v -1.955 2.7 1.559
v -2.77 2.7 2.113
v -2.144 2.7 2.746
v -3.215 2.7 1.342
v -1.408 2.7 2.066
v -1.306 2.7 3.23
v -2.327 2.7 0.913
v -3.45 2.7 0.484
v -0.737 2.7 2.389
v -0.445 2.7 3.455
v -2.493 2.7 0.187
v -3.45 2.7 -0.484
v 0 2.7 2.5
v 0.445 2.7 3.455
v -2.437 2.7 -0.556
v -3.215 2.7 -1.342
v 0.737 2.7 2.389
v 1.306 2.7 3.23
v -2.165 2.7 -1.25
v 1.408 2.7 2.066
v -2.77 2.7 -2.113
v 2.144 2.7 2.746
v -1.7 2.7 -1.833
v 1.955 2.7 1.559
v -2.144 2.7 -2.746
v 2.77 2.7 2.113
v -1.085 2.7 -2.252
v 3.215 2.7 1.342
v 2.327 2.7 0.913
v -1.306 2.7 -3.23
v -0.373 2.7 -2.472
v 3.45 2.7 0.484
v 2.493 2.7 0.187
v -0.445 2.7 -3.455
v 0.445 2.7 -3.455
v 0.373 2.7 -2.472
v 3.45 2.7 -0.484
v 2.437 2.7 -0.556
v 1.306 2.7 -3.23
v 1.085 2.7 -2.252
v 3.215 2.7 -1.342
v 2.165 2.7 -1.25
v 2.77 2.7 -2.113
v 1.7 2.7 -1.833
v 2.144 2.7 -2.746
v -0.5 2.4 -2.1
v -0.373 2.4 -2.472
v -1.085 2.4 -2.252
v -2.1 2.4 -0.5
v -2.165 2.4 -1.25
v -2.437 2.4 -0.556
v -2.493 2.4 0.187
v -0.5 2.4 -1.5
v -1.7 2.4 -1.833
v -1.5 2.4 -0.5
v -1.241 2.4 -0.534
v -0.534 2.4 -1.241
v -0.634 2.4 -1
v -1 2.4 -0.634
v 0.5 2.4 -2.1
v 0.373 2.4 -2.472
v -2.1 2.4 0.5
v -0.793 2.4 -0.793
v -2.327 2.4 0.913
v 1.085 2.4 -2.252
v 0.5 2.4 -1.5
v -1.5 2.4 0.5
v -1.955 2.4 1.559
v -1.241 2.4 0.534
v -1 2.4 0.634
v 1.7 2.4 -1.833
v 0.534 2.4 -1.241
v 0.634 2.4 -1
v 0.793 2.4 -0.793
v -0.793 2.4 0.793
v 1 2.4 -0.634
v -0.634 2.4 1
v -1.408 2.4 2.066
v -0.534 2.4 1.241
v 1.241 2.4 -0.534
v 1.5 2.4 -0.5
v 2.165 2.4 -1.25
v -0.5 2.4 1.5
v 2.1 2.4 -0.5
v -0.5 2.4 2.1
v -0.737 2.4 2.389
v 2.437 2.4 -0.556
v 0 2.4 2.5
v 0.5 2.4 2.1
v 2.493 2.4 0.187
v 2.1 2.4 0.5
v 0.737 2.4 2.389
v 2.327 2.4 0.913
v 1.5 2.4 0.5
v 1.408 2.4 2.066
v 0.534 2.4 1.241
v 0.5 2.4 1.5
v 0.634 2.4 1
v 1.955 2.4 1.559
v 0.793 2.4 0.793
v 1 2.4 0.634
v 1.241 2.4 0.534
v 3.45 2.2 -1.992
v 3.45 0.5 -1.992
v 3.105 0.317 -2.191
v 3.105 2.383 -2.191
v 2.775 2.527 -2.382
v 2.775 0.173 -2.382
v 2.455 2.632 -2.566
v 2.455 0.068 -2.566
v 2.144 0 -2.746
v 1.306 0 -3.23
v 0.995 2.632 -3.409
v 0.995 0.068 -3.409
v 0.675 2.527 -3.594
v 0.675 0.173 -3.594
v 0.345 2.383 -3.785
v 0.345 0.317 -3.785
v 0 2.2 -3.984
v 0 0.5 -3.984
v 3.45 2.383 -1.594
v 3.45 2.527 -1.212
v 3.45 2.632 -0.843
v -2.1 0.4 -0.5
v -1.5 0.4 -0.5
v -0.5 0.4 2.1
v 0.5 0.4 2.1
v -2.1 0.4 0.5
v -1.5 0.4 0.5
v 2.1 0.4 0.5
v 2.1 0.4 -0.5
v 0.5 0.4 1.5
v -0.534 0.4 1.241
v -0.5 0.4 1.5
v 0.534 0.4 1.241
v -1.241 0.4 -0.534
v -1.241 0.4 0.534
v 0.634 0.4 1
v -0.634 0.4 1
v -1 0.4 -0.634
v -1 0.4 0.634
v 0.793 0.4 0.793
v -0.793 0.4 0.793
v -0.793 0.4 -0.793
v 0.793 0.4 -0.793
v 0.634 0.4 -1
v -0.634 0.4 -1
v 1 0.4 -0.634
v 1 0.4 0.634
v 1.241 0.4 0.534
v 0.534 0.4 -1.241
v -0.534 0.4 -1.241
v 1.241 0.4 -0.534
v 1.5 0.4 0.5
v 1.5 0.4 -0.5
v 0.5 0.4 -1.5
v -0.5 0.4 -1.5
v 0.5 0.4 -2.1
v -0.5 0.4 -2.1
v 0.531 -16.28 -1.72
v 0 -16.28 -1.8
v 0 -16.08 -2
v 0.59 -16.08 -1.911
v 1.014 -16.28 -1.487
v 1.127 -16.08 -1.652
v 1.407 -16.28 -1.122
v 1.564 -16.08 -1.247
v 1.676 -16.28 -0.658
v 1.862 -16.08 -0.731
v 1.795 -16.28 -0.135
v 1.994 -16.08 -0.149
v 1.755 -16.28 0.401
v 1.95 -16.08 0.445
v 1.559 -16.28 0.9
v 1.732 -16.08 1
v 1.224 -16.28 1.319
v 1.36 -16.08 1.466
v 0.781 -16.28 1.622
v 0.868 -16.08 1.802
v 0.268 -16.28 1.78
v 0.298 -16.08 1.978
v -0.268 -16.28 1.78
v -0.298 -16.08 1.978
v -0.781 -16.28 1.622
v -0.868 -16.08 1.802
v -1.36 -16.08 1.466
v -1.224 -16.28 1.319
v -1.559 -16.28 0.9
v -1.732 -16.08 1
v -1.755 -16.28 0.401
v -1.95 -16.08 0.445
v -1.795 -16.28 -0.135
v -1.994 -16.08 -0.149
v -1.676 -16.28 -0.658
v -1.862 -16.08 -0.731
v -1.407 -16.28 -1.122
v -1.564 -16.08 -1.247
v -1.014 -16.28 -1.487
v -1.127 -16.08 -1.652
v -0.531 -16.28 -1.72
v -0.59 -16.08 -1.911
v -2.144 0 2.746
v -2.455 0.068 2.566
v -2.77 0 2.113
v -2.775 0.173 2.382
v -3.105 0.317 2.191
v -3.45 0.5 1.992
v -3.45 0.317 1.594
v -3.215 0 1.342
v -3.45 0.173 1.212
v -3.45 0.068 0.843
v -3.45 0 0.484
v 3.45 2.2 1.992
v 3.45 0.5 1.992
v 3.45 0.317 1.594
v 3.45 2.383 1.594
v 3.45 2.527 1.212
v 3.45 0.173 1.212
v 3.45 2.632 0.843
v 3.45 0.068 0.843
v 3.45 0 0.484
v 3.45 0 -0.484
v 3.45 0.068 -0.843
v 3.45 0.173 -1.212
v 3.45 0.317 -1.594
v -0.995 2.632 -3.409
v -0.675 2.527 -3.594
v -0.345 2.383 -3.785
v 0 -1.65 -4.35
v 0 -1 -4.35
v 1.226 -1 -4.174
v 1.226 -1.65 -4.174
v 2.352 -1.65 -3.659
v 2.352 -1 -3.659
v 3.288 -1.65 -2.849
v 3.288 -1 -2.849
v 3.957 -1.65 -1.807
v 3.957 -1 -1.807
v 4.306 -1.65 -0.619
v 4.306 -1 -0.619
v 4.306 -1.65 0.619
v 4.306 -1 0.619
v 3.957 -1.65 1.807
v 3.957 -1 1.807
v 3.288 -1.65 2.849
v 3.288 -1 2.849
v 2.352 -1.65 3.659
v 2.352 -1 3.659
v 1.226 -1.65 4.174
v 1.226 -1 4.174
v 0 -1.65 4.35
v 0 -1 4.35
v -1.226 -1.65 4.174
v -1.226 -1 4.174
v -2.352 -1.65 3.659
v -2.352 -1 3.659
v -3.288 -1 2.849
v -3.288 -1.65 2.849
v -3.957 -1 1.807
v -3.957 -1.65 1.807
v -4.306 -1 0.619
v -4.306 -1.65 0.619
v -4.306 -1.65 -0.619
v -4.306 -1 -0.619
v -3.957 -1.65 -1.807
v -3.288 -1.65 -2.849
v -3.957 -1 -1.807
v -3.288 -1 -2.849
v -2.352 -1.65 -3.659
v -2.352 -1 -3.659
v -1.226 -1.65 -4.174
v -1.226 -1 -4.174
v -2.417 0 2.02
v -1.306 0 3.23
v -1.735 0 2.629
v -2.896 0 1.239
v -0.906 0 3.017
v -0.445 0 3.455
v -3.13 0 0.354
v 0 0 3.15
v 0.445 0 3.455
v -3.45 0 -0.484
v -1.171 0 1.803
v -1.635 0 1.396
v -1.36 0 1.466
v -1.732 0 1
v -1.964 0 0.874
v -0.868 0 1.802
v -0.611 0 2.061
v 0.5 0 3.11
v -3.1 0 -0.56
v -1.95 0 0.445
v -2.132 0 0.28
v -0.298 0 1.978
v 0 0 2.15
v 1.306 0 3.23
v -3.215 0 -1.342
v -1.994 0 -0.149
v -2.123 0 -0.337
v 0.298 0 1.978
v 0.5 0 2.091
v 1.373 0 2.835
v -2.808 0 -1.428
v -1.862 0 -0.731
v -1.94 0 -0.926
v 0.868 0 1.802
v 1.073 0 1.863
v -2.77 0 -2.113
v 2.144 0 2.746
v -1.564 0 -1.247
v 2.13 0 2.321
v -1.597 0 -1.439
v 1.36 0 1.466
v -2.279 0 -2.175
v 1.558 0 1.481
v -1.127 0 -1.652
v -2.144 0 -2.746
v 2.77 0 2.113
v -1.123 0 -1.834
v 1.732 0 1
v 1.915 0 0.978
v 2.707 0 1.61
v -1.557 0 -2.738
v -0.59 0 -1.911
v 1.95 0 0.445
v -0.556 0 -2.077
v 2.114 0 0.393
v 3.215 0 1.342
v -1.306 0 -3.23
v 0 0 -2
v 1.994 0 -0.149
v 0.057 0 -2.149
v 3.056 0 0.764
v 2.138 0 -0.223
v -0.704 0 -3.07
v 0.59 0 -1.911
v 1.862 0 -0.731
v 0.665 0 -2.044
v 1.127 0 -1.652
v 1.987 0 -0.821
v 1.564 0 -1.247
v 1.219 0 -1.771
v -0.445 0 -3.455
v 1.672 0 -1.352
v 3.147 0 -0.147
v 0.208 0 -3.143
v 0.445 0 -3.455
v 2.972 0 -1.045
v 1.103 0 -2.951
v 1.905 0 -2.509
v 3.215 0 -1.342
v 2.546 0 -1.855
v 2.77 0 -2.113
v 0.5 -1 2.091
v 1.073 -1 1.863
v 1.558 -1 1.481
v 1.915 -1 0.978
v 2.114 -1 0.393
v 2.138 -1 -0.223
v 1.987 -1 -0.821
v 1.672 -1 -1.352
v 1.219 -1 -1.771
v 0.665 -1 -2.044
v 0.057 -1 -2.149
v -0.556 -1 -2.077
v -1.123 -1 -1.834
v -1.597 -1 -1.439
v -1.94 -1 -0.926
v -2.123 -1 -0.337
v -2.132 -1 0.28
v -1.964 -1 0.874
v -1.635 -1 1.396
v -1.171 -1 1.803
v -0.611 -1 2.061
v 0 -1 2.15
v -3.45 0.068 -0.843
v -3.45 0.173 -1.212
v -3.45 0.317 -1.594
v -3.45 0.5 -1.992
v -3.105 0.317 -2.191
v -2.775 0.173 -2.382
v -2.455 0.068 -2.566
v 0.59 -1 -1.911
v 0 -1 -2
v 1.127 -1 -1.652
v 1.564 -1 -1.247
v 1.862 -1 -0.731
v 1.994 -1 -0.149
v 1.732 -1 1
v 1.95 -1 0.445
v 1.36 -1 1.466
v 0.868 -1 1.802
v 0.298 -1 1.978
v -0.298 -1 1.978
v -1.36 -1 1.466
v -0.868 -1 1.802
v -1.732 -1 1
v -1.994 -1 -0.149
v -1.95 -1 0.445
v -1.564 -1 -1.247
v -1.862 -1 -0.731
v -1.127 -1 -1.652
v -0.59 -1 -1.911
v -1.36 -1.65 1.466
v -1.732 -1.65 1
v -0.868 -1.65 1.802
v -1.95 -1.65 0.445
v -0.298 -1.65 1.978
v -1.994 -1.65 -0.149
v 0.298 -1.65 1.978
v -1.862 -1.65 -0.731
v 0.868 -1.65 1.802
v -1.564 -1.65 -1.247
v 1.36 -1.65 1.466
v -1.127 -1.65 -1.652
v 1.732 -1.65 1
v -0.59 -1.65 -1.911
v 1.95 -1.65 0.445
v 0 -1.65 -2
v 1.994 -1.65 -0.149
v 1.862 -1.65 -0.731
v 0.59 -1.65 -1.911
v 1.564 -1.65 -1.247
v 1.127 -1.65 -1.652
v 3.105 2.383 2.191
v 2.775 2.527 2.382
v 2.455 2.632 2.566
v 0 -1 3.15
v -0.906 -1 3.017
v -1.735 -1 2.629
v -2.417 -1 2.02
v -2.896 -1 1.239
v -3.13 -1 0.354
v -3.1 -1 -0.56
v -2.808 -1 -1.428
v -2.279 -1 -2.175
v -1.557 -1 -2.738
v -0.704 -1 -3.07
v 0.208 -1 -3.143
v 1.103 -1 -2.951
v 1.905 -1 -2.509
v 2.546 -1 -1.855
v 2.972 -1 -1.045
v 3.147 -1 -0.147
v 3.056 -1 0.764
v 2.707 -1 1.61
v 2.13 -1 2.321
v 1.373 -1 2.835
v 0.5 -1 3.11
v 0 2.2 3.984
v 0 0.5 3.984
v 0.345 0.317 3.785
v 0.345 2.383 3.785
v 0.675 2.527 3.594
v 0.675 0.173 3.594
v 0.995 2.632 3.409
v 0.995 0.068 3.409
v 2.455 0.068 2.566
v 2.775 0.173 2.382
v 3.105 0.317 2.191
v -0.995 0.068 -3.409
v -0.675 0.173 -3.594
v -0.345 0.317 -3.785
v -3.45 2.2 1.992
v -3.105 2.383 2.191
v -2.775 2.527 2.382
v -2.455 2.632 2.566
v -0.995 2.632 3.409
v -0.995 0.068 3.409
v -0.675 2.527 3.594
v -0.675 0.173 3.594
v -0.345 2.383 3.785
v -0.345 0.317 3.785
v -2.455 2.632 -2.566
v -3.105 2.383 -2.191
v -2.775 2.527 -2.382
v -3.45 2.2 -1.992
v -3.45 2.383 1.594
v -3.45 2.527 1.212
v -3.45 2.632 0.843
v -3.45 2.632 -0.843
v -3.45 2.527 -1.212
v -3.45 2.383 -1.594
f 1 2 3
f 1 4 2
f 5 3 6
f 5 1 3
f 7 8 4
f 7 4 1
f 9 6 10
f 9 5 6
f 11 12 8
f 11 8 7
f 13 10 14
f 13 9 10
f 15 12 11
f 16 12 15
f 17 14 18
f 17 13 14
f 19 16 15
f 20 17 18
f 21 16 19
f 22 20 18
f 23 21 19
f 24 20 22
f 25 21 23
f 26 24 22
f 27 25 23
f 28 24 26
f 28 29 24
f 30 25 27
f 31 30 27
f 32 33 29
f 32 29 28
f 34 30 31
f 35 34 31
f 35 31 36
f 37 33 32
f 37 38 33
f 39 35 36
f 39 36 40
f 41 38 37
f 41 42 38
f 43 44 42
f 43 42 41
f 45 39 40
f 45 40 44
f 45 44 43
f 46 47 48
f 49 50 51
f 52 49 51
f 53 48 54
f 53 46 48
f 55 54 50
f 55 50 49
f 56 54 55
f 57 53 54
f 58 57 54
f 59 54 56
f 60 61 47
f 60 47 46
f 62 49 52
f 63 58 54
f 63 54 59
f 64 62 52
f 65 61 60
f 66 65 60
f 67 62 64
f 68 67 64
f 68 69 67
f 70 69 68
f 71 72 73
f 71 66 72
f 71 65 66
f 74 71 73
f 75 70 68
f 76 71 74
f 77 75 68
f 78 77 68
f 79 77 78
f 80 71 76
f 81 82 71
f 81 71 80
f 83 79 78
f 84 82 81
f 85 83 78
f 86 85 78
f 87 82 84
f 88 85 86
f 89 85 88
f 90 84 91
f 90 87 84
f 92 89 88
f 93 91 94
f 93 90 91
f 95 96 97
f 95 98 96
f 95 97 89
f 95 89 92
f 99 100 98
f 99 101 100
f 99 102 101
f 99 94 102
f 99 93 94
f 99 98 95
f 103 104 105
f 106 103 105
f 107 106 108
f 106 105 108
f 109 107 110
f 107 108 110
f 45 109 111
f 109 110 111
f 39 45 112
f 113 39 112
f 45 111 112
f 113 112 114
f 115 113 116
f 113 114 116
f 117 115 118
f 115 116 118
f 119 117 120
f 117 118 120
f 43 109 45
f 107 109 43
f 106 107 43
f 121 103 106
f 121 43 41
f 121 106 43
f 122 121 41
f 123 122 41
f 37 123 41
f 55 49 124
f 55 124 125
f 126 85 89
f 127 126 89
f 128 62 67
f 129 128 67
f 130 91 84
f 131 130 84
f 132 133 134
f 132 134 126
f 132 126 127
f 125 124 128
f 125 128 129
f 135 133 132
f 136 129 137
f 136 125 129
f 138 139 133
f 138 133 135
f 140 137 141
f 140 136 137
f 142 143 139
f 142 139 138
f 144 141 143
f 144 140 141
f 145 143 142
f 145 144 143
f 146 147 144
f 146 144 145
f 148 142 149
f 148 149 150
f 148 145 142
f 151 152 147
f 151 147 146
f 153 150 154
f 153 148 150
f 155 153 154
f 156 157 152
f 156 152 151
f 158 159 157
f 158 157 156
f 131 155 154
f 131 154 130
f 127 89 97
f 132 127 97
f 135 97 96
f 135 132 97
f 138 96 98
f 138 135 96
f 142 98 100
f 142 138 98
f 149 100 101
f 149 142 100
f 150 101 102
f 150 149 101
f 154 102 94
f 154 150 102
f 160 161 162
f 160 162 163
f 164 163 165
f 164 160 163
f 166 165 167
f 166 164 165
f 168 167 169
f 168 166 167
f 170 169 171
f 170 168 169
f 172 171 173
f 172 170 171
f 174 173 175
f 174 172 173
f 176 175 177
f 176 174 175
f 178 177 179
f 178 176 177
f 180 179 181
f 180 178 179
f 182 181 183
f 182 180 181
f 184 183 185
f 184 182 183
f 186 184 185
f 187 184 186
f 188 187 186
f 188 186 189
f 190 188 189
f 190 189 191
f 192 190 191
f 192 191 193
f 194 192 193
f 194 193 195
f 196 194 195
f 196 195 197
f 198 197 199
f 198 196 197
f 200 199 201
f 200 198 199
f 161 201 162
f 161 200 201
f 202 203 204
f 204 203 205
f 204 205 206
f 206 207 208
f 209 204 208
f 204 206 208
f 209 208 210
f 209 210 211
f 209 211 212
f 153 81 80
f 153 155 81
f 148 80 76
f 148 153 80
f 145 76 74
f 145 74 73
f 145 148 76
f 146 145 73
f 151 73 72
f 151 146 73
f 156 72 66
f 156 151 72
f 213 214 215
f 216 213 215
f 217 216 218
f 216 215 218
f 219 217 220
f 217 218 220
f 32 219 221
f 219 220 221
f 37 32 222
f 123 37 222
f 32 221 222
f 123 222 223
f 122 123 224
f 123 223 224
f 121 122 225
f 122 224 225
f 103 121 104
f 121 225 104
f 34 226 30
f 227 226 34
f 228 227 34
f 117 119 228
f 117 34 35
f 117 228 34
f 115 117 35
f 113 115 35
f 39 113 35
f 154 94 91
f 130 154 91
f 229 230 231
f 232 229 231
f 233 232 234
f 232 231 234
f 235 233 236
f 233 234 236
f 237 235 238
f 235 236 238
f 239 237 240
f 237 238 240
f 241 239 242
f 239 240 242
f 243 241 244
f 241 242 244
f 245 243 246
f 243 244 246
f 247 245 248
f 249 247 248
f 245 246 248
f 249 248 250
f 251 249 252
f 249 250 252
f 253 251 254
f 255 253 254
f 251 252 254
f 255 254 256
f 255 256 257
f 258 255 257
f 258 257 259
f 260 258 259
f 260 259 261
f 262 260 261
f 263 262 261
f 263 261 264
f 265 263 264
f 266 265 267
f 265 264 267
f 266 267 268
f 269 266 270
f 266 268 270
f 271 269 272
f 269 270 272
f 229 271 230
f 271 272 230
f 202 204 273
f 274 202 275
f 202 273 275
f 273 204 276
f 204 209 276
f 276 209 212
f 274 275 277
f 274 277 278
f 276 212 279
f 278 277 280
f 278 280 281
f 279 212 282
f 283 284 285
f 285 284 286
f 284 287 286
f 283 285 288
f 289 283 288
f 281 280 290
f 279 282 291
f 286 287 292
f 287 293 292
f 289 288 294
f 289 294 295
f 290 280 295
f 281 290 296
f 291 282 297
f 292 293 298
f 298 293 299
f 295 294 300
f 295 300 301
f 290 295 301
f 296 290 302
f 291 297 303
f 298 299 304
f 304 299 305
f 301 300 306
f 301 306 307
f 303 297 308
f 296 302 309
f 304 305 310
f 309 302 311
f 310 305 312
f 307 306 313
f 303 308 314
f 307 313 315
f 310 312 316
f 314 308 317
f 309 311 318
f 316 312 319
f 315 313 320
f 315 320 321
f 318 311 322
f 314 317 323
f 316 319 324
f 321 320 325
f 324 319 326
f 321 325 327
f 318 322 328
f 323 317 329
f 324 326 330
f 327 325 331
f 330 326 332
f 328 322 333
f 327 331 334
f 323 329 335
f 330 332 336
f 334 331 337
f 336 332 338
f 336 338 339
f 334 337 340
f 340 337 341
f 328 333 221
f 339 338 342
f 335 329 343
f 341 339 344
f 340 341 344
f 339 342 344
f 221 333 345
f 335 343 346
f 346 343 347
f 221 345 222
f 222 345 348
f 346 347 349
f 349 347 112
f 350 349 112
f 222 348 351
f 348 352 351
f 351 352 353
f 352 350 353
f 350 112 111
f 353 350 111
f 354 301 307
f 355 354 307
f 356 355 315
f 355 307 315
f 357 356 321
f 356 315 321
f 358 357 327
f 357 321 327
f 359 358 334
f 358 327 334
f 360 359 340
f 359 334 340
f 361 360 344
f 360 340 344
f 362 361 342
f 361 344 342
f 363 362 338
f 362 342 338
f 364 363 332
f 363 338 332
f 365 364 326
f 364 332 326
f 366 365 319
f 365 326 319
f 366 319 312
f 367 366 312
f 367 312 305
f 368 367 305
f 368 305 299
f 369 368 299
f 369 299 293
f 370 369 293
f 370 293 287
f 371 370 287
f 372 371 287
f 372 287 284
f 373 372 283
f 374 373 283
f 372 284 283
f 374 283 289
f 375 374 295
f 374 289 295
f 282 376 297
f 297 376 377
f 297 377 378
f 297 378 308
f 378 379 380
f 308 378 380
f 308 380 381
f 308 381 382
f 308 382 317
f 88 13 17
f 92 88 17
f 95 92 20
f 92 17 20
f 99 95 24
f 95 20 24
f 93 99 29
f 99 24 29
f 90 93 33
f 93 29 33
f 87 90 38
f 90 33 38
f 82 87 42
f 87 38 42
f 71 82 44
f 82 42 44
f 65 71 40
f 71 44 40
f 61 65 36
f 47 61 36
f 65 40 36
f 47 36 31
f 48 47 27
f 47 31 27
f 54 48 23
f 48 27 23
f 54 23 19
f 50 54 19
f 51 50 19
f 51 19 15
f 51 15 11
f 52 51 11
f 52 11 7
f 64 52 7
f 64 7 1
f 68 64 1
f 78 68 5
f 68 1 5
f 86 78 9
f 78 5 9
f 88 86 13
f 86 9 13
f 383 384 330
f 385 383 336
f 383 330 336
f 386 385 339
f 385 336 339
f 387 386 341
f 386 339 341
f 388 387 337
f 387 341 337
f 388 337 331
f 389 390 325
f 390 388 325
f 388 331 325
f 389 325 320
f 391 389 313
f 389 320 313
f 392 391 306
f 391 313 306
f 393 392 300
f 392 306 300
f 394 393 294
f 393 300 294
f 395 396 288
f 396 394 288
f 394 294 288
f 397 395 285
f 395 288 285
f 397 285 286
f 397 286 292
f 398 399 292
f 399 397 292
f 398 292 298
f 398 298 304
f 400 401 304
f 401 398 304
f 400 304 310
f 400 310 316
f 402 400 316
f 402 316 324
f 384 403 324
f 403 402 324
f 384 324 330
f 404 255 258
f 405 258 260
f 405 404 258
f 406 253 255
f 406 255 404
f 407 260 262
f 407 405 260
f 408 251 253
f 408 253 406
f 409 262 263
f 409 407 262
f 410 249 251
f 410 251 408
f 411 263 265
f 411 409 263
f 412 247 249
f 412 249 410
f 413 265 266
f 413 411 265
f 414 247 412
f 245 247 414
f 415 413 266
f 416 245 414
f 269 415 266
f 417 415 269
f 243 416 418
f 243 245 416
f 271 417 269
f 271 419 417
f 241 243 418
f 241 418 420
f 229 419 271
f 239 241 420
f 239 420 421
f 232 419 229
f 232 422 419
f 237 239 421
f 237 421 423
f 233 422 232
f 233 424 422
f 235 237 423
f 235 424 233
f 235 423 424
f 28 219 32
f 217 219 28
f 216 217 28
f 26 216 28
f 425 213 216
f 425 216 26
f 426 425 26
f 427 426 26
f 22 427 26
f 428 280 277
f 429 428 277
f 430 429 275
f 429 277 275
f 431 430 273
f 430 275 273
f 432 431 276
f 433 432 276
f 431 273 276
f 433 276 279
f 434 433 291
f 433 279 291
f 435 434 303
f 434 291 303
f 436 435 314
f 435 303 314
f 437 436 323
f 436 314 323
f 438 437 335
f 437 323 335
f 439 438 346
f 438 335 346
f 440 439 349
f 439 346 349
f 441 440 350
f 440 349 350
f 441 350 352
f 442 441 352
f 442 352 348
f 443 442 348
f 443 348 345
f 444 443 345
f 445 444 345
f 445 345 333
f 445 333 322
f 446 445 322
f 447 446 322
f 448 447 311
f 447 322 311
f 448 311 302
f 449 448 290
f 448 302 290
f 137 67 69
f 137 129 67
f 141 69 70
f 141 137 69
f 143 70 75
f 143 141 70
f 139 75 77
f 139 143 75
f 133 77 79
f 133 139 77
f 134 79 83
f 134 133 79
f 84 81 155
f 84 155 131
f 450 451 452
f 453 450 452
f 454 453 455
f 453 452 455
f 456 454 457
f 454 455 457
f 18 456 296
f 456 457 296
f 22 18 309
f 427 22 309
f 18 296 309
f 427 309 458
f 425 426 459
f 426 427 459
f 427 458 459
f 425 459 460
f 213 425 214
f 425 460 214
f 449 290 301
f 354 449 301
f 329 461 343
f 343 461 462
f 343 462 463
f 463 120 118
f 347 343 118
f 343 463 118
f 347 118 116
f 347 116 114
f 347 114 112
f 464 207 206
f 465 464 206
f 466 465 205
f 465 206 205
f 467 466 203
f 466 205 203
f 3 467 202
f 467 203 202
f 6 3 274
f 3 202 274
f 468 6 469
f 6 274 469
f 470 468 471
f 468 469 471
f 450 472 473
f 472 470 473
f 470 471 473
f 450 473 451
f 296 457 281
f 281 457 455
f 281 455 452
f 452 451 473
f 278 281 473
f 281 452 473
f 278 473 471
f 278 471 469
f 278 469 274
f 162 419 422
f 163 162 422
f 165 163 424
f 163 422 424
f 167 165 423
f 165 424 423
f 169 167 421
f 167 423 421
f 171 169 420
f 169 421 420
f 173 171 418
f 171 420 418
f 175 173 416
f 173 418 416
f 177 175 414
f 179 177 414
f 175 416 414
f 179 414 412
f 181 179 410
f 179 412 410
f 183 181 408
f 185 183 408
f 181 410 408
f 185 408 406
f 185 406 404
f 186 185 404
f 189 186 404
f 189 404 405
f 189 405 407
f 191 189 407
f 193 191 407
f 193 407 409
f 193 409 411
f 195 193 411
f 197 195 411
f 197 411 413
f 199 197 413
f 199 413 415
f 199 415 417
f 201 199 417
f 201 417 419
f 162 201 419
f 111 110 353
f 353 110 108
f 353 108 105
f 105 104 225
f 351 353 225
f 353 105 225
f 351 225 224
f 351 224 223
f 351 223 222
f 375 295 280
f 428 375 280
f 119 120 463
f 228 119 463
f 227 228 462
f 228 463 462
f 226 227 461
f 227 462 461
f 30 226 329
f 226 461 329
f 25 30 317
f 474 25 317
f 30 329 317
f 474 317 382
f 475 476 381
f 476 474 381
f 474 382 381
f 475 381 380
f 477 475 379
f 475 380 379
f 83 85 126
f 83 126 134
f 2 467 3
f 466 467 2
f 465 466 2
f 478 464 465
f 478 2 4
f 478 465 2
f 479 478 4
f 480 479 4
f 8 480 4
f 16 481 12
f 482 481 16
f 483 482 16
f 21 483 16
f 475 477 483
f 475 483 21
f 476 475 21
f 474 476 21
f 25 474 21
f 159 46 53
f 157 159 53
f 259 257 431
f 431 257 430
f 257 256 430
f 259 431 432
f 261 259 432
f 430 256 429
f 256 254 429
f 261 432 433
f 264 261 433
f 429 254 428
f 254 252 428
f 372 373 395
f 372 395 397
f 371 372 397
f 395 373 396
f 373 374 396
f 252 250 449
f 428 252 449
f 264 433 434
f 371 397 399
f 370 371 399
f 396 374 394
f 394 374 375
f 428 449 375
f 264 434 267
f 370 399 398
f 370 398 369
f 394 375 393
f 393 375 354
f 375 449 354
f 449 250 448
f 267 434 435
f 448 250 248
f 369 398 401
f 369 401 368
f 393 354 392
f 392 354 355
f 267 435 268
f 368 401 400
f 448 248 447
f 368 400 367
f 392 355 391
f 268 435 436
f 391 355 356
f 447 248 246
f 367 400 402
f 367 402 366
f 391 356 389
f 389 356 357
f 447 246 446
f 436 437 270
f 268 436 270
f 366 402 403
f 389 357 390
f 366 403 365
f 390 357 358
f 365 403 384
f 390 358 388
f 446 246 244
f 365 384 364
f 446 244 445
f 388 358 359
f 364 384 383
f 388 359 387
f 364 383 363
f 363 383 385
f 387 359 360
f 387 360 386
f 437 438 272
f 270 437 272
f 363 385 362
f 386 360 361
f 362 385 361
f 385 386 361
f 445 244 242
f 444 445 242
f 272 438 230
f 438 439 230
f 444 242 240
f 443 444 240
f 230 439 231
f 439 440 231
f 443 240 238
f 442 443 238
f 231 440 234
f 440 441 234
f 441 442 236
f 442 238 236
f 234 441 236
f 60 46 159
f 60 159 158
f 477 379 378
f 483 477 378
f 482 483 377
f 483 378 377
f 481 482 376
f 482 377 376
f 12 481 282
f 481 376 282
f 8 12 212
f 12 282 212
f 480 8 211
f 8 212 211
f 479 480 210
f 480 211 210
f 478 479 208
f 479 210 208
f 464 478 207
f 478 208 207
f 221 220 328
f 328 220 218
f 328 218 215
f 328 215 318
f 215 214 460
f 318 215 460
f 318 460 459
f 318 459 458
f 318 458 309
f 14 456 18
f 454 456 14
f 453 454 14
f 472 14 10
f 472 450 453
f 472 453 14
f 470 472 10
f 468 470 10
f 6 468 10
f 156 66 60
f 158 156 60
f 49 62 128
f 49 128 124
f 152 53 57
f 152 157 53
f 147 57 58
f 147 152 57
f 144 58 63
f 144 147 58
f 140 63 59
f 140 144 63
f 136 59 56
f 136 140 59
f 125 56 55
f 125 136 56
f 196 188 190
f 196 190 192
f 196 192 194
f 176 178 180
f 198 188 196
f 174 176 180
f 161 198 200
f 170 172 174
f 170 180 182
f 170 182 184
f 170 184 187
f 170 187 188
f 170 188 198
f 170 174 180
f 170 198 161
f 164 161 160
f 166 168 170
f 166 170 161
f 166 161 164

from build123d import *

# Parameters (mm, degrees)
BOSS_EXTRUDE1_DEPTH = 2.7
SKETCH3_R           = 2.5
CUT_EXTRUDE1_DEPTH  = 0.3
SKETCH4_R           = 2
BOSS_EXTRUDE2_DEPTH = 16.28
BOSS_EXTRUDE3_DEPTH = 1
SKETCH7_R           = 4.35
BOSS_EXTRUDE4_DEPTH = 0.65
SKETCH8_W           = 1
SKETCH8_H           = 1.6
SKETCH8_H_2         = 1
SKETCH8_W_2         = 1.6
CUT_EXTRUDE2_DEPTH  = 2
FILLET1_R           = 1
CHAMFER1_SIZE       = 0.2


with BuildPart() as part:
    # Sketch2 → Boss-Extrude1 (new body)
    with BuildSketch(Plane(origin=(0, 0, 0), x_dir=(1, 0, 0), z_dir=(0, 1, 0))):
        Polygon((0, -3.983716857), (3.45, -1.991858429), (3.45, 1.991858429), (0, 3.983716857), (-3.45, 1.991858429), (-3.45, -1.991858429), align=None)
    extrude(amount=BOSS_EXTRUDE1_DEPTH)

    # Sketch3 → Cut-Extrude1 (cut)
    with BuildSketch(Plane(origin=(0, 2.7, 0), x_dir=(1, 0, 0), z_dir=(0, 1, 0))):
        with Locations(Location((0, 0, 0), (0, 0, 270))):
            Circle(SKETCH3_R)
    extrude(amount=-CUT_EXTRUDE1_DEPTH, mode=Mode.SUBTRACT)

    # Sketch4 → Boss-Extrude2 (add)
    with BuildSketch(Plane.XZ):
        with Locations(Location((0, 0, 0), (0, 0, 270))):
            Circle(SKETCH4_R)
    extrude(amount=BOSS_EXTRUDE2_DEPTH)

    # Sketch5 → Boss-Extrude3 (add)
    with BuildSketch(Plane.XZ):
        with BuildLine():
            Line((0, 2.15), (0, 3.15))
            ThreePointArc((0, 3.15), (-0.250796162, -3.140000205), (0.5, 3.110064308))
            Line((0.5, 3.110064308), (0.5, 2.091052367))
            ThreePointArc((0.5, 2.091052367), (-0.251731416, -2.135212236), (0, 2.15))
        make_face()
    extrude(amount=BOSS_EXTRUDE3_DEPTH)

    # Sketch7 → Boss-Extrude4 (add)
    with BuildSketch(Plane.XZ.offset(1)):
        with Locations(Location((0, 0, 0), (0, 0, 270))):
            Circle(SKETCH7_R)
    extrude(amount=BOSS_EXTRUDE4_DEPTH)

    # Sketch8 → Cut-Extrude2 (cut)
    with BuildSketch(Plane(origin=(0, 2.4, 0), x_dir=(1, 0, 0), z_dir=(0, 1, 0))):
        with Locations((0, 1.3)):
            Rectangle(SKETCH8_W, SKETCH8_H)
        Rectangle(SKETCH8_W, SKETCH8_H_2)
        with Locations((-1.3, 0)):
            Rectangle(SKETCH8_W_2, SKETCH8_H_2)
        with Locations((0, -1.3)):
            Rectangle(SKETCH8_W, SKETCH8_H)
        with Locations((1.3, 0)):
            Rectangle(SKETCH8_W_2, SKETCH8_H_2)
    extrude(amount=-CUT_EXTRUDE2_DEPTH, mode=Mode.SUBTRACT)

    # Fillet1
    fillet1_edges = [part.edges().sort_by_distance(p)[0] for p in [
        (-0.5, 1.4, -0.5),
        (0.5, 1.4, -0.5),
        (0.5, 1.4, 0.5),
        (-0.5, 1.4, 0.5),
    ]]
    fillet(fillet1_edges, radius=FILLET1_R)

    # Sketch9 → Cut-Revolve1 (revolve, cut)
    with BuildSketch(Plane(origin=(0, 0, 0), x_dir=(0, 0, -1), z_dir=(1, 0, 0))):
        Polygon((-3.983716857, 2.7), (-3.483716857, 2.7), (-3.983716857, 2.2), align=None)
        Polygon((-3.983716857, 0.5), (-3.983716857, 0), (-3.483716857, 0), align=None)
    revolve(axis=Axis((0, 0, 0), (0, -1, 0)), mode=Mode.SUBTRACT)

    # Chamfer1
    chamfer1_edges = [part.edges().sort_by_distance(p)[0] for p in [
        (0, -16.28, 2),
    ]]
    chamfer(chamfer1_edges, length=CHAMFER1_SIZE)


solid = part.part
